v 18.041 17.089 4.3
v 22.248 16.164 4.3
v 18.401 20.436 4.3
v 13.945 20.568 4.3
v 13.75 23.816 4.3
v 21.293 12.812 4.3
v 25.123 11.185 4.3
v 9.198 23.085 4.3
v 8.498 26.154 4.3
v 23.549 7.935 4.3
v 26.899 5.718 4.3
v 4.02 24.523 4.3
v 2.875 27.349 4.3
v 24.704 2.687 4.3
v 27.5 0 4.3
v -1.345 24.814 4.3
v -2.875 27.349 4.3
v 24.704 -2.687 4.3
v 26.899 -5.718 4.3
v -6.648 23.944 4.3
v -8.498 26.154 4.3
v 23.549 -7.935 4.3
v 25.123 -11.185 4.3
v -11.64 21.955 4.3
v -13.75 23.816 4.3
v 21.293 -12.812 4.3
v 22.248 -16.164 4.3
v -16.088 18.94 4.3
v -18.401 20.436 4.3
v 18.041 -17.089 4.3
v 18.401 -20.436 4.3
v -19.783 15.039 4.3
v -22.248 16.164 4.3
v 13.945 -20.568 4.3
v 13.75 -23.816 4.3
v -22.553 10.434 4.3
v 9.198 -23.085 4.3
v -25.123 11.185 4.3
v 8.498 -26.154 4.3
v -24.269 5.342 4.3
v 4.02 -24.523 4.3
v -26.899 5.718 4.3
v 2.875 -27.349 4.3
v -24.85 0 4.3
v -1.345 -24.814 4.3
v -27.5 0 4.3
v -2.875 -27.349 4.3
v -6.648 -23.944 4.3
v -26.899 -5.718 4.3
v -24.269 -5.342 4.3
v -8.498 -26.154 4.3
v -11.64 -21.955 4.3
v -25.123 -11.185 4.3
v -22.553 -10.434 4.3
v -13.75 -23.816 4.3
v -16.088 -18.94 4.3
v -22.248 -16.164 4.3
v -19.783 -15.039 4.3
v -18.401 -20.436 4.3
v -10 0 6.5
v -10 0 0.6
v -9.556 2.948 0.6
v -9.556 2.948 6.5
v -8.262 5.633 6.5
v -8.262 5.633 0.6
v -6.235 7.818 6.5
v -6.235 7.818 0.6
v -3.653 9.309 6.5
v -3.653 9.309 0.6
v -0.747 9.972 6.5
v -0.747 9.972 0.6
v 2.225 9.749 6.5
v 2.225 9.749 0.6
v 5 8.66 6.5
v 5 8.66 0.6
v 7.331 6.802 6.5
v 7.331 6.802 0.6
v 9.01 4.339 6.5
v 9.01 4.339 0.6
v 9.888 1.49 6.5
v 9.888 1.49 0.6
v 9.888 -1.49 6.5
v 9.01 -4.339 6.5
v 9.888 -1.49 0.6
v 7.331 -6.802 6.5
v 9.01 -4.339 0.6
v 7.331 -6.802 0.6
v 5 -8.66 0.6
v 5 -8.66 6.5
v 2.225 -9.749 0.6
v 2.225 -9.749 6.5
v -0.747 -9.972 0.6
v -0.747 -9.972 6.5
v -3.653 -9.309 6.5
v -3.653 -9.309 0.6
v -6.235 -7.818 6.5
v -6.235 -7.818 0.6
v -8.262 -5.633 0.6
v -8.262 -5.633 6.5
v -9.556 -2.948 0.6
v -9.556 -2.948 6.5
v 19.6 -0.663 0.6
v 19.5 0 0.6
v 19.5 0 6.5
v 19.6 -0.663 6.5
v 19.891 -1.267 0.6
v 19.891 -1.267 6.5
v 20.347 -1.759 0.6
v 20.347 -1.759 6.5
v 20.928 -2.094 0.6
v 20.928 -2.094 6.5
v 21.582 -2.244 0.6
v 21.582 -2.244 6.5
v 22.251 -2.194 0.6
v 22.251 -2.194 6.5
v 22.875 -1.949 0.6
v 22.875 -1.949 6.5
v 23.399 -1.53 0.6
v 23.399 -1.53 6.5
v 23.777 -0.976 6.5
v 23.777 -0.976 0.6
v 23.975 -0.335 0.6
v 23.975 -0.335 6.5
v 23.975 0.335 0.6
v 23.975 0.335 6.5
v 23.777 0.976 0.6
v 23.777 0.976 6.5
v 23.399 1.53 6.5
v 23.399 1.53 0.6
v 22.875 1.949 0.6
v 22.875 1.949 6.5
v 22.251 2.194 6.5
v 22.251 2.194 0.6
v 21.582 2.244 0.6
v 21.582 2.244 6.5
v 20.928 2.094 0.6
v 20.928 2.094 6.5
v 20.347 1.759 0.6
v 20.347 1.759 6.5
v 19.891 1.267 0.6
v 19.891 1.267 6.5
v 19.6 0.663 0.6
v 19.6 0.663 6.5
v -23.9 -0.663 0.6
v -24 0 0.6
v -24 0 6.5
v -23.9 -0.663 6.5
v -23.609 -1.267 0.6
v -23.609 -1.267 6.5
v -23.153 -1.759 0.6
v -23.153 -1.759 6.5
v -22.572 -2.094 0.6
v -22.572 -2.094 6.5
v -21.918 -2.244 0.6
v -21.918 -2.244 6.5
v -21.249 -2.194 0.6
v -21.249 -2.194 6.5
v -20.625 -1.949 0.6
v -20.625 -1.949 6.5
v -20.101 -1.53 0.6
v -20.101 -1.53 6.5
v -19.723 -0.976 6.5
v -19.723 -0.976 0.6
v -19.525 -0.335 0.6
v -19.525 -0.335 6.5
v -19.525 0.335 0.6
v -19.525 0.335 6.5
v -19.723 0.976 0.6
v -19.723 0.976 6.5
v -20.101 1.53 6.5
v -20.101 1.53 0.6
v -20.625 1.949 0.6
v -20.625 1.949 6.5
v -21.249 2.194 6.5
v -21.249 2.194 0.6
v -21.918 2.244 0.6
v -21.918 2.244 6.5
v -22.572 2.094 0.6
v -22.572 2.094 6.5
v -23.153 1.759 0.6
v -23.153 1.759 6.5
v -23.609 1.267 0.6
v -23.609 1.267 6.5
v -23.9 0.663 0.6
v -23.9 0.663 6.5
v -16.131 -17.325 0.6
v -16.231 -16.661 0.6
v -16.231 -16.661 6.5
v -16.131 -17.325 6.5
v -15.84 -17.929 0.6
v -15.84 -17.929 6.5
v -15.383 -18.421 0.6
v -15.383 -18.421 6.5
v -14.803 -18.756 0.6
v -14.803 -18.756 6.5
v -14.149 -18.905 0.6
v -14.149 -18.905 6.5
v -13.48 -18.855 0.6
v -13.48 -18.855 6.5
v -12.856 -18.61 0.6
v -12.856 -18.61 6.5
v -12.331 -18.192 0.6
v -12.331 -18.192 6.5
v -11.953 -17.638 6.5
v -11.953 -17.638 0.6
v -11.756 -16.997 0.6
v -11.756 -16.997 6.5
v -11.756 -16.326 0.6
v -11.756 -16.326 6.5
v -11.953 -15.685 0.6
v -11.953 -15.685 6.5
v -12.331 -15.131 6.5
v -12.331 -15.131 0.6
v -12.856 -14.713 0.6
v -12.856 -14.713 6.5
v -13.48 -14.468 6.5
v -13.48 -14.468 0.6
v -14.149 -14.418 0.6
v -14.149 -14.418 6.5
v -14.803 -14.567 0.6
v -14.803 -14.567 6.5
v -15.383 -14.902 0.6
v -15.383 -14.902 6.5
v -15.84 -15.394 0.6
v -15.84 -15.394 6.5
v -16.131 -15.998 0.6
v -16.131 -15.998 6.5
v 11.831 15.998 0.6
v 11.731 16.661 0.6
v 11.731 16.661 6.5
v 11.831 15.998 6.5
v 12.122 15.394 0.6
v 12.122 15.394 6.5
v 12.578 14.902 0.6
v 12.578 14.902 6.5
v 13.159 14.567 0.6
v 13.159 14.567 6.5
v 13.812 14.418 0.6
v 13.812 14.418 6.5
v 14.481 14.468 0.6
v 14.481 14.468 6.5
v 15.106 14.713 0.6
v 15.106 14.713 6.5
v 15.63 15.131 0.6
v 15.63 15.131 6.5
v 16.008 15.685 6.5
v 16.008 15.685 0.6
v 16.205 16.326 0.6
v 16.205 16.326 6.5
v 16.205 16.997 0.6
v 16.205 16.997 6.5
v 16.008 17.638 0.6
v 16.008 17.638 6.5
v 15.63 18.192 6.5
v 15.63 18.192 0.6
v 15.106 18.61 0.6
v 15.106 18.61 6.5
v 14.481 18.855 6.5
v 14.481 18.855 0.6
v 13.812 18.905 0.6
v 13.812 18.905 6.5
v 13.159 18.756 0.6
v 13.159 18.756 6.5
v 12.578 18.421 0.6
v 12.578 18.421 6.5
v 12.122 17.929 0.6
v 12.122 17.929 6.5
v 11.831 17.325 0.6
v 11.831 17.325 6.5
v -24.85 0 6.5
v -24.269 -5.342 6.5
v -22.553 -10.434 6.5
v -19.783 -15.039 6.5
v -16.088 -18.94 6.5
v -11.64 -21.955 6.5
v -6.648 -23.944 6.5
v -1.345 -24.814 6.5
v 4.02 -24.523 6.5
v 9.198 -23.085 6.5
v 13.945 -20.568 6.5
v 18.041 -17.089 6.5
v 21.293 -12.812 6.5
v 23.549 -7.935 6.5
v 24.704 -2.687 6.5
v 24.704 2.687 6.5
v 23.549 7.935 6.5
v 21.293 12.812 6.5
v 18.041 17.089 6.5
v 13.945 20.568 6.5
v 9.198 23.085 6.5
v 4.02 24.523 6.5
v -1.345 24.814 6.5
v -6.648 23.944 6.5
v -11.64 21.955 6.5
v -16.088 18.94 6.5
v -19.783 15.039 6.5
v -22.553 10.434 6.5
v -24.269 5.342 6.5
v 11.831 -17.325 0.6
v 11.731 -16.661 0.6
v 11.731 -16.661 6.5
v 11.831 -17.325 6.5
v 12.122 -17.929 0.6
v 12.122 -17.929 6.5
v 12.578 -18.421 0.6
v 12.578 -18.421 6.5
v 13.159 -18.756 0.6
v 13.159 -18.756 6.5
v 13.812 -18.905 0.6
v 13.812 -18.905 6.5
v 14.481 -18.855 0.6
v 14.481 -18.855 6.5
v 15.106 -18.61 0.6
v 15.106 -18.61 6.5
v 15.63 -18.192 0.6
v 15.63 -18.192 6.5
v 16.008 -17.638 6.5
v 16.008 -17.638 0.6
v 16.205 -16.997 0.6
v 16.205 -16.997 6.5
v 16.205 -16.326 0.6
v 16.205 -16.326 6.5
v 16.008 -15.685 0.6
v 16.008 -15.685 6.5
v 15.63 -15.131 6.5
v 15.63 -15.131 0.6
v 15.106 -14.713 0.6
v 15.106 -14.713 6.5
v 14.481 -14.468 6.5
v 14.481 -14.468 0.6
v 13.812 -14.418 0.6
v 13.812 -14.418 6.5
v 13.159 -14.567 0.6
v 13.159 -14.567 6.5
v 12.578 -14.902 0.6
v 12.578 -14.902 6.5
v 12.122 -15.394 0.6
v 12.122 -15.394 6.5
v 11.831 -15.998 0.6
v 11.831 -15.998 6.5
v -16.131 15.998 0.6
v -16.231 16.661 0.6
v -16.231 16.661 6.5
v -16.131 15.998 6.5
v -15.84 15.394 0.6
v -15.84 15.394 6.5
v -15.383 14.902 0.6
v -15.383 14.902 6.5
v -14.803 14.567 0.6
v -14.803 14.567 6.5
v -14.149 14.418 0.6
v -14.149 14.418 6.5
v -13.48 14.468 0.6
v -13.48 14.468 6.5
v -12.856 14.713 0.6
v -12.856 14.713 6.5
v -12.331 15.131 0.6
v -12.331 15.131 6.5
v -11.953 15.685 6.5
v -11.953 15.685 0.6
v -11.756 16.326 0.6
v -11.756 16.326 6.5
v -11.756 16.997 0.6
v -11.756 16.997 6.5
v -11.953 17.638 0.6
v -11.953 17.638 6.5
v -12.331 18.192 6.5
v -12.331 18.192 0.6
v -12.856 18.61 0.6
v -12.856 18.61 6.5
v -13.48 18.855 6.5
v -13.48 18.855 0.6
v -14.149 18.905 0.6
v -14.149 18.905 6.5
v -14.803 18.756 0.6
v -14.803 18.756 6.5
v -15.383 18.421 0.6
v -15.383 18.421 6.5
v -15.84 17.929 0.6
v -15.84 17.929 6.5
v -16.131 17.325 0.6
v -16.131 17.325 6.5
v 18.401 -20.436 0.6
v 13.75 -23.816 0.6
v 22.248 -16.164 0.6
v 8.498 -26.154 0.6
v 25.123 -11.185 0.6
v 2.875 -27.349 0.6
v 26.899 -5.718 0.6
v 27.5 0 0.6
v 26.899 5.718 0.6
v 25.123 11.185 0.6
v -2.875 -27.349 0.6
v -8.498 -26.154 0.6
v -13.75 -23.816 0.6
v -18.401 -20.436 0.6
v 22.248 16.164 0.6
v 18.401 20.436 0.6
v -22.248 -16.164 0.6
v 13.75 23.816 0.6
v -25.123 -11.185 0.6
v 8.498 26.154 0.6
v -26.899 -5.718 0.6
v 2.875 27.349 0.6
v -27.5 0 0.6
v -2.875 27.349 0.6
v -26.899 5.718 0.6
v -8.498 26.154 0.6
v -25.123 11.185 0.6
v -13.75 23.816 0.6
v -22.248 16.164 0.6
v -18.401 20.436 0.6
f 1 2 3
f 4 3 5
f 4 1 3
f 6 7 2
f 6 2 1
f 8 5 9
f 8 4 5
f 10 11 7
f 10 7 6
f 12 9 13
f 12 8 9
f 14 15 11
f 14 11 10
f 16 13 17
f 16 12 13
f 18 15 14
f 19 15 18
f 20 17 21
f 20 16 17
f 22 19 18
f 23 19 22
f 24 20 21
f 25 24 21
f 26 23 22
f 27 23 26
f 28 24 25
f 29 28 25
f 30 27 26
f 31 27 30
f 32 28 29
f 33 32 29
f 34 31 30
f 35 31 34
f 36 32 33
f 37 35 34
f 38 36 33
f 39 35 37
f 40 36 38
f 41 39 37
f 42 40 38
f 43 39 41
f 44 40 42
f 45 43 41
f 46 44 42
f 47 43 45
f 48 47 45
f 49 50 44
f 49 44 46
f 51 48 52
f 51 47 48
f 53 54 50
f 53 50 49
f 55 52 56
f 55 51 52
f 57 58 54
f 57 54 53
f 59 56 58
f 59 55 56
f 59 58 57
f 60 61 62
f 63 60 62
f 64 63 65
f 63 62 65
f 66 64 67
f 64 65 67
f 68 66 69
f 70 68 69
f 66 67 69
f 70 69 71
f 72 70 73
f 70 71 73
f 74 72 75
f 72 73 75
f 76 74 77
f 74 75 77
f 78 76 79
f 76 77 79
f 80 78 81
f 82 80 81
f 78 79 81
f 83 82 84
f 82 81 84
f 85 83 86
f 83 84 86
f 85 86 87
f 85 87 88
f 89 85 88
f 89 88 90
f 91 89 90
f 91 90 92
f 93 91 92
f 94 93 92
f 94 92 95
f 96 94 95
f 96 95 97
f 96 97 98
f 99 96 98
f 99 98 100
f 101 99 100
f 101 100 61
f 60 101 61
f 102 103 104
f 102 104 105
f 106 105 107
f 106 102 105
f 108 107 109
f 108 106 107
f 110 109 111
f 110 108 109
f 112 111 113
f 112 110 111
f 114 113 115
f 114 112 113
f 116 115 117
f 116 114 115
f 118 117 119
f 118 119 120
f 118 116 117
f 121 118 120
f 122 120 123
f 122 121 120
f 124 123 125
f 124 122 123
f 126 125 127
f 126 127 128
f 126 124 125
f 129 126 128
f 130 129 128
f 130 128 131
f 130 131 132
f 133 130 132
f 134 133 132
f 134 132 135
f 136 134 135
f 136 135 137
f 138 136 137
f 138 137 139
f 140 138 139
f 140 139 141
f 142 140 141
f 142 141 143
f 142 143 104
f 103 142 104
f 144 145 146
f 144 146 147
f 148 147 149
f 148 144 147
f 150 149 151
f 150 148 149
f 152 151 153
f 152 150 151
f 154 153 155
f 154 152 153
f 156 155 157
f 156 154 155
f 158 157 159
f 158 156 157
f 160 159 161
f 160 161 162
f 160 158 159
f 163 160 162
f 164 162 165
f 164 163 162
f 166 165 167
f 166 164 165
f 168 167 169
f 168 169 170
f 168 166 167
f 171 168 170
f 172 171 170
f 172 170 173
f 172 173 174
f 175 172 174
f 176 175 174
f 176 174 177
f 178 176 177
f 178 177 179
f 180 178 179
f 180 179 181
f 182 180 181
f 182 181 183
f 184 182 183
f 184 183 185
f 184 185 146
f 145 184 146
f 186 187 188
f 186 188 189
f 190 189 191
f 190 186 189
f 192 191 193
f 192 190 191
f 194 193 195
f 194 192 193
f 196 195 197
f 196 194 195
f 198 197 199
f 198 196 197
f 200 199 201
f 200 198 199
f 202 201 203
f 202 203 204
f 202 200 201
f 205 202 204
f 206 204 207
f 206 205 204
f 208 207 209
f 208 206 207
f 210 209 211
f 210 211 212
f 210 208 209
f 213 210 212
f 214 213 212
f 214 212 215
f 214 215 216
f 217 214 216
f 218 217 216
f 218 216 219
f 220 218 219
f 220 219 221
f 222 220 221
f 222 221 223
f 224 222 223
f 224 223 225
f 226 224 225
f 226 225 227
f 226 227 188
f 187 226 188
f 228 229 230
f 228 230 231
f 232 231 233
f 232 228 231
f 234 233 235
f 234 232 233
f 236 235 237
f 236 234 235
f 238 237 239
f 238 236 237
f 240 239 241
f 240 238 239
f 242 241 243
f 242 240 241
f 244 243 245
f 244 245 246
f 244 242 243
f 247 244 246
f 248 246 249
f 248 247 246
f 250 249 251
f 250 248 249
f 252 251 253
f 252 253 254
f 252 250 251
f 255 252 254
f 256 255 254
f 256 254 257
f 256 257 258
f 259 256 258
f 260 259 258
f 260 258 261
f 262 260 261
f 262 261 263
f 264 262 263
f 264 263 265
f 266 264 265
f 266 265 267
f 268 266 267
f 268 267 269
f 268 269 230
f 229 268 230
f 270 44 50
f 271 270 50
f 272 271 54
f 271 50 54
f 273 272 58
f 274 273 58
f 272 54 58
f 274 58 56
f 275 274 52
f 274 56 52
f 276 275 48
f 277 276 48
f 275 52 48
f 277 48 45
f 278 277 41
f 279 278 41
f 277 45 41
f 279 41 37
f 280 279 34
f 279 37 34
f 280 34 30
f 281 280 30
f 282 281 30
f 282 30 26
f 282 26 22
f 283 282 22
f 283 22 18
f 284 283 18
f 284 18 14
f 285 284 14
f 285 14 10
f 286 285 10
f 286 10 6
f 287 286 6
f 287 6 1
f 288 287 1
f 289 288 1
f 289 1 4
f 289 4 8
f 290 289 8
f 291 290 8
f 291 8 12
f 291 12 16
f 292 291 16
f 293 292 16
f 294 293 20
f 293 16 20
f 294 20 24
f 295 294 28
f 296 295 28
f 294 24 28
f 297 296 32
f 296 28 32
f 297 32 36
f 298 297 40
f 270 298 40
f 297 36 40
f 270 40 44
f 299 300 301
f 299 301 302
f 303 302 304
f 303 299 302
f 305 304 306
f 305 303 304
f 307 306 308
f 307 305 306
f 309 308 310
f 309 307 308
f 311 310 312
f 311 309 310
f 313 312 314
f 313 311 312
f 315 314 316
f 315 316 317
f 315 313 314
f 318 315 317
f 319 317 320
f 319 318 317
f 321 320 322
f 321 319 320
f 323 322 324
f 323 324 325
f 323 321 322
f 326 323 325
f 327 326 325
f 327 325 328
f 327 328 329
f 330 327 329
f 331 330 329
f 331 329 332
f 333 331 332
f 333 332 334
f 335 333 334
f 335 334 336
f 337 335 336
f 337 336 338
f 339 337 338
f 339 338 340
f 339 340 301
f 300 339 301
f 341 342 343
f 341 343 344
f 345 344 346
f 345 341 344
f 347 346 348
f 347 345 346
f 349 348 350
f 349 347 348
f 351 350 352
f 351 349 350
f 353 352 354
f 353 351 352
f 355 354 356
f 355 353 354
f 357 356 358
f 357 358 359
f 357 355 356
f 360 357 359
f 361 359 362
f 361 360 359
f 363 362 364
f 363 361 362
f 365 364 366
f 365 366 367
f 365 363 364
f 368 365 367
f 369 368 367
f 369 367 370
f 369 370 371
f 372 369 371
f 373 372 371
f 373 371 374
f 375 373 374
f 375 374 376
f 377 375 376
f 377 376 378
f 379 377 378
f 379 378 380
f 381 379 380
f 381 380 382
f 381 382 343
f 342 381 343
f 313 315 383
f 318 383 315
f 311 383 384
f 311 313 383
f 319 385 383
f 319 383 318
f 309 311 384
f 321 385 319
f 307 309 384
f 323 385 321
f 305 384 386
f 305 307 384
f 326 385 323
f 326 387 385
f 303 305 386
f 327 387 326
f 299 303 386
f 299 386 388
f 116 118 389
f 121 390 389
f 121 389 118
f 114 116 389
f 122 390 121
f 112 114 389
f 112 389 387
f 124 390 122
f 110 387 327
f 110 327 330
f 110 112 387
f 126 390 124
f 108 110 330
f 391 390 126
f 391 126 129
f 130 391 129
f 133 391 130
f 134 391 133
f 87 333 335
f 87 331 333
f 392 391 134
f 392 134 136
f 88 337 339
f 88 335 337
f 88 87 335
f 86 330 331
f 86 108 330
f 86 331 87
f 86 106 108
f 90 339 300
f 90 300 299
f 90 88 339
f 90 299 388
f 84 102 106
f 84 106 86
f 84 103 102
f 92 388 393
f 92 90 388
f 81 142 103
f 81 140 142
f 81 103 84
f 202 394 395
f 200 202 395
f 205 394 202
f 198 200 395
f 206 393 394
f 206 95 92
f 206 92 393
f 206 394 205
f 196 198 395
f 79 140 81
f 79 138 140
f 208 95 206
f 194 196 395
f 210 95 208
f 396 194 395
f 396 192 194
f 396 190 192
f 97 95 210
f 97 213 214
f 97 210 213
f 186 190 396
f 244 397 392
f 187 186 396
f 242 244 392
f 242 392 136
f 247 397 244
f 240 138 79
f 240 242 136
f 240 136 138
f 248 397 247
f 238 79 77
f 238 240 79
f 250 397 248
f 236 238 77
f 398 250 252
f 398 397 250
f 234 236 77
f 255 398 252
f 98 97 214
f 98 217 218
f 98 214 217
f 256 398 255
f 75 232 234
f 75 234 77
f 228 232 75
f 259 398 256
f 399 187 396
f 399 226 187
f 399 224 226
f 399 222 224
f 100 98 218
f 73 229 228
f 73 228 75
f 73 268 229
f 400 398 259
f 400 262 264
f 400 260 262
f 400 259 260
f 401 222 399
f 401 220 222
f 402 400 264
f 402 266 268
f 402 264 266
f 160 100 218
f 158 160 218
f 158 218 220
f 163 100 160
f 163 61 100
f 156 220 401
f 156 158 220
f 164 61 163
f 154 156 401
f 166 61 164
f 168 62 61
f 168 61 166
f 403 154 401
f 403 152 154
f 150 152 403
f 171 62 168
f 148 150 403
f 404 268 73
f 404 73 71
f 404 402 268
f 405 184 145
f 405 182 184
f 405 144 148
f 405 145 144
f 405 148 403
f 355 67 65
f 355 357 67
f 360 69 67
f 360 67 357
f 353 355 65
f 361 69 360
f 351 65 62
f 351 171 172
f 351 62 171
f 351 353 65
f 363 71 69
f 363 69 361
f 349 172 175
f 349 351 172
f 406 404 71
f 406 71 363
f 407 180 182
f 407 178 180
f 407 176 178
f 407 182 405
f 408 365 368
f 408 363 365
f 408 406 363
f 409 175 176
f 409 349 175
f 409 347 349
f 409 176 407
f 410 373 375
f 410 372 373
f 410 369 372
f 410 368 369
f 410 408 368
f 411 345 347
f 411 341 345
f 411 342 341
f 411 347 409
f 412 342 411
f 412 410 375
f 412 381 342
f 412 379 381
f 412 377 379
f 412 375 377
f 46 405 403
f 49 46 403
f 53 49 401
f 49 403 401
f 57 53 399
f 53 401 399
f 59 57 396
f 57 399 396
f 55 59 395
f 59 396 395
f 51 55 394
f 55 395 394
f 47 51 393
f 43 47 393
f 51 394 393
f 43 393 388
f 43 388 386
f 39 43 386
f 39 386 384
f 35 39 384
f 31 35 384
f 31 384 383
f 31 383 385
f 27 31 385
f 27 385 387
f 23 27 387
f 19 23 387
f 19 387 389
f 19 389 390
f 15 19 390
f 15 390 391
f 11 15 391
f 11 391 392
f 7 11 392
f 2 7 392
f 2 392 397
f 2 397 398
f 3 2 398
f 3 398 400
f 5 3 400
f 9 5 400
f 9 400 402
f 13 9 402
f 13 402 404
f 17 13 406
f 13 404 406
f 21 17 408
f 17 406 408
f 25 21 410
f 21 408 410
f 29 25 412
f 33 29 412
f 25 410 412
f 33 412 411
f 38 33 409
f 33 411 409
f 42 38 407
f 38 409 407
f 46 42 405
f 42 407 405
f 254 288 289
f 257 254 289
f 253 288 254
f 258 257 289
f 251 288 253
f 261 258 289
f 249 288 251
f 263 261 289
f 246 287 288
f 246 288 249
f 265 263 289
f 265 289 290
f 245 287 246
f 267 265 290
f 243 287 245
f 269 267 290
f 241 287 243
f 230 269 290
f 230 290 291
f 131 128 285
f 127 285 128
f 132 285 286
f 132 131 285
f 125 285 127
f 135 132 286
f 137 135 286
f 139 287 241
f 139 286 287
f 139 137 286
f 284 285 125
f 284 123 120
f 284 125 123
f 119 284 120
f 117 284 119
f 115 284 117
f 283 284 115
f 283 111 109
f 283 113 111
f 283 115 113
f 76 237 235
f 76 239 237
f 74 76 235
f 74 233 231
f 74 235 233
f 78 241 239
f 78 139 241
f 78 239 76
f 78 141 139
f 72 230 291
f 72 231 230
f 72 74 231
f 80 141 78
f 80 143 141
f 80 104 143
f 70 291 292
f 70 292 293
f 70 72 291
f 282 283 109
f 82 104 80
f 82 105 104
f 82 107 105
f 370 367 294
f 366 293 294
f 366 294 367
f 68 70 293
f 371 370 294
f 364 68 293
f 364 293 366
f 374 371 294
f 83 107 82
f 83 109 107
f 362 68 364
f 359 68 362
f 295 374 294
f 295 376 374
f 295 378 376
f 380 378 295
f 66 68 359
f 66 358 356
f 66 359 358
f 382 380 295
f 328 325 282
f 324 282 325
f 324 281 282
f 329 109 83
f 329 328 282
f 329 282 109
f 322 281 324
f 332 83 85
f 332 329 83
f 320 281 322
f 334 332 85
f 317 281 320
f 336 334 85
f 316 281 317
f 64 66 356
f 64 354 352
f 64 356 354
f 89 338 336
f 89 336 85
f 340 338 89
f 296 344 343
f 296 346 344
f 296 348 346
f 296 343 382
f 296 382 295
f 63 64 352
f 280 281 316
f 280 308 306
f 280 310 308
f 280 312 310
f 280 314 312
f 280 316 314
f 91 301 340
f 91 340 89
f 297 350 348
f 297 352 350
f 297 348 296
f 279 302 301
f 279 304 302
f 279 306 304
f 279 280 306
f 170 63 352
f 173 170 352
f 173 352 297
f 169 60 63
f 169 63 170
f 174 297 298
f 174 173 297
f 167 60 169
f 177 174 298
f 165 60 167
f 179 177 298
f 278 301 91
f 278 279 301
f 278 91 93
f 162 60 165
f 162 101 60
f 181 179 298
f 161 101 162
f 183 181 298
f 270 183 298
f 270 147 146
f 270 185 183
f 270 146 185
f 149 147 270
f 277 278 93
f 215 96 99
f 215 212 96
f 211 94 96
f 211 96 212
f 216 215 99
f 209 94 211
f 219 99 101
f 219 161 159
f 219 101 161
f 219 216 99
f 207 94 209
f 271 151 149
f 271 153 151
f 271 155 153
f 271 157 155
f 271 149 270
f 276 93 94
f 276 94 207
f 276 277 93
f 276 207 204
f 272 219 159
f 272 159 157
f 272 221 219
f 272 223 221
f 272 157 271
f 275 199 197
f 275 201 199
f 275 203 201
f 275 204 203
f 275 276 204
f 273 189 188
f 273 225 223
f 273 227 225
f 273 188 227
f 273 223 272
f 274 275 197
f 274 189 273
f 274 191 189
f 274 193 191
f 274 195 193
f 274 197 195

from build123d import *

# Parameters (mm, degrees)
SKETCH_1_R          = 24.85
SKETCH_1_R_2        = 2.25
EXTRUDE_1_DEPTH     = 6.5
SKETCH_3_R          = 27.5
SKETCH_3_R_2        = 24.85
EXTRUDE_2_DEPTH     = 4.3
SKETCH_4_R          = 27.5
CUT_EXTRUDE_1_DEPTH = 0.6
SKETCH_5_R          = 10
CUT_EXTRUDE_2_DEPTH = 40.335861501


with BuildPart() as part:
    # 草图1 → 凸台-拉伸1 (new body)
    with BuildSketch(Plane.XY):
        with Locations(Location((0, 0, 0), (0, 0, 180))):
            Circle(SKETCH_1_R)
        with Locations(Location((-21.75, 0, 0), (0, 0, 180))):
            Circle(SKETCH_1_R_2, mode=Mode.SUBTRACT)
        with Locations(Location((-13.980630511, 16.661466638, 0), (0, 0, 180))):
            Circle(SKETCH_1_R_2, mode=Mode.SUBTRACT)
        with Locations(Location((-13.980630511, -16.661466638, 0), (0, 0, 180))):
            Circle(SKETCH_1_R_2, mode=Mode.SUBTRACT)
        with Locations(Location((13.980630511, -16.661466638, 0), (0, 0, 180))):
            Circle(SKETCH_1_R_2, mode=Mode.SUBTRACT)
        with Locations(Location((21.75, 0, 0), (0, 0, 180))):
            Circle(SKETCH_1_R_2, mode=Mode.SUBTRACT)
        with Locations(Location((13.980630511, 16.661466638, 0), (0, 0, 180))):
            Circle(SKETCH_1_R_2, mode=Mode.SUBTRACT)
    extrude(amount=EXTRUDE_1_DEPTH)

    # 草图3 → 凸台-拉伸2 (add)
    with BuildSketch(Plane.XY):
        with Locations(Location((0, 0, 0), (0, 0, 180))):
            Circle(SKETCH_3_R)
        with Locations(Location((0, 0, 0), (0, 0, 180))):
            Circle(SKETCH_3_R_2, mode=Mode.SUBTRACT)
    extrude(amount=EXTRUDE_2_DEPTH)

    # 草图4 → 切除-拉伸1 (cut)
    with BuildSketch(Plane(origin=(0, 0, 0), x_dir=(-1, 0, 0), z_dir=(0, 0, -1))):
        Circle(SKETCH_4_R)
    extrude(amount=-CUT_EXTRUDE_1_DEPTH, mode=Mode.SUBTRACT)

    # 草图5 → 切除-拉伸2 (cut, through all)
    with BuildSketch(Plane(origin=(0, 0, 0.6), x_dir=(-1, 0, 0), z_dir=(0, 0, -1))):
        Circle(SKETCH_5_R)
    extrude(amount=-CUT_EXTRUDE_2_DEPTH, mode=Mode.SUBTRACT)


solid = part.part
